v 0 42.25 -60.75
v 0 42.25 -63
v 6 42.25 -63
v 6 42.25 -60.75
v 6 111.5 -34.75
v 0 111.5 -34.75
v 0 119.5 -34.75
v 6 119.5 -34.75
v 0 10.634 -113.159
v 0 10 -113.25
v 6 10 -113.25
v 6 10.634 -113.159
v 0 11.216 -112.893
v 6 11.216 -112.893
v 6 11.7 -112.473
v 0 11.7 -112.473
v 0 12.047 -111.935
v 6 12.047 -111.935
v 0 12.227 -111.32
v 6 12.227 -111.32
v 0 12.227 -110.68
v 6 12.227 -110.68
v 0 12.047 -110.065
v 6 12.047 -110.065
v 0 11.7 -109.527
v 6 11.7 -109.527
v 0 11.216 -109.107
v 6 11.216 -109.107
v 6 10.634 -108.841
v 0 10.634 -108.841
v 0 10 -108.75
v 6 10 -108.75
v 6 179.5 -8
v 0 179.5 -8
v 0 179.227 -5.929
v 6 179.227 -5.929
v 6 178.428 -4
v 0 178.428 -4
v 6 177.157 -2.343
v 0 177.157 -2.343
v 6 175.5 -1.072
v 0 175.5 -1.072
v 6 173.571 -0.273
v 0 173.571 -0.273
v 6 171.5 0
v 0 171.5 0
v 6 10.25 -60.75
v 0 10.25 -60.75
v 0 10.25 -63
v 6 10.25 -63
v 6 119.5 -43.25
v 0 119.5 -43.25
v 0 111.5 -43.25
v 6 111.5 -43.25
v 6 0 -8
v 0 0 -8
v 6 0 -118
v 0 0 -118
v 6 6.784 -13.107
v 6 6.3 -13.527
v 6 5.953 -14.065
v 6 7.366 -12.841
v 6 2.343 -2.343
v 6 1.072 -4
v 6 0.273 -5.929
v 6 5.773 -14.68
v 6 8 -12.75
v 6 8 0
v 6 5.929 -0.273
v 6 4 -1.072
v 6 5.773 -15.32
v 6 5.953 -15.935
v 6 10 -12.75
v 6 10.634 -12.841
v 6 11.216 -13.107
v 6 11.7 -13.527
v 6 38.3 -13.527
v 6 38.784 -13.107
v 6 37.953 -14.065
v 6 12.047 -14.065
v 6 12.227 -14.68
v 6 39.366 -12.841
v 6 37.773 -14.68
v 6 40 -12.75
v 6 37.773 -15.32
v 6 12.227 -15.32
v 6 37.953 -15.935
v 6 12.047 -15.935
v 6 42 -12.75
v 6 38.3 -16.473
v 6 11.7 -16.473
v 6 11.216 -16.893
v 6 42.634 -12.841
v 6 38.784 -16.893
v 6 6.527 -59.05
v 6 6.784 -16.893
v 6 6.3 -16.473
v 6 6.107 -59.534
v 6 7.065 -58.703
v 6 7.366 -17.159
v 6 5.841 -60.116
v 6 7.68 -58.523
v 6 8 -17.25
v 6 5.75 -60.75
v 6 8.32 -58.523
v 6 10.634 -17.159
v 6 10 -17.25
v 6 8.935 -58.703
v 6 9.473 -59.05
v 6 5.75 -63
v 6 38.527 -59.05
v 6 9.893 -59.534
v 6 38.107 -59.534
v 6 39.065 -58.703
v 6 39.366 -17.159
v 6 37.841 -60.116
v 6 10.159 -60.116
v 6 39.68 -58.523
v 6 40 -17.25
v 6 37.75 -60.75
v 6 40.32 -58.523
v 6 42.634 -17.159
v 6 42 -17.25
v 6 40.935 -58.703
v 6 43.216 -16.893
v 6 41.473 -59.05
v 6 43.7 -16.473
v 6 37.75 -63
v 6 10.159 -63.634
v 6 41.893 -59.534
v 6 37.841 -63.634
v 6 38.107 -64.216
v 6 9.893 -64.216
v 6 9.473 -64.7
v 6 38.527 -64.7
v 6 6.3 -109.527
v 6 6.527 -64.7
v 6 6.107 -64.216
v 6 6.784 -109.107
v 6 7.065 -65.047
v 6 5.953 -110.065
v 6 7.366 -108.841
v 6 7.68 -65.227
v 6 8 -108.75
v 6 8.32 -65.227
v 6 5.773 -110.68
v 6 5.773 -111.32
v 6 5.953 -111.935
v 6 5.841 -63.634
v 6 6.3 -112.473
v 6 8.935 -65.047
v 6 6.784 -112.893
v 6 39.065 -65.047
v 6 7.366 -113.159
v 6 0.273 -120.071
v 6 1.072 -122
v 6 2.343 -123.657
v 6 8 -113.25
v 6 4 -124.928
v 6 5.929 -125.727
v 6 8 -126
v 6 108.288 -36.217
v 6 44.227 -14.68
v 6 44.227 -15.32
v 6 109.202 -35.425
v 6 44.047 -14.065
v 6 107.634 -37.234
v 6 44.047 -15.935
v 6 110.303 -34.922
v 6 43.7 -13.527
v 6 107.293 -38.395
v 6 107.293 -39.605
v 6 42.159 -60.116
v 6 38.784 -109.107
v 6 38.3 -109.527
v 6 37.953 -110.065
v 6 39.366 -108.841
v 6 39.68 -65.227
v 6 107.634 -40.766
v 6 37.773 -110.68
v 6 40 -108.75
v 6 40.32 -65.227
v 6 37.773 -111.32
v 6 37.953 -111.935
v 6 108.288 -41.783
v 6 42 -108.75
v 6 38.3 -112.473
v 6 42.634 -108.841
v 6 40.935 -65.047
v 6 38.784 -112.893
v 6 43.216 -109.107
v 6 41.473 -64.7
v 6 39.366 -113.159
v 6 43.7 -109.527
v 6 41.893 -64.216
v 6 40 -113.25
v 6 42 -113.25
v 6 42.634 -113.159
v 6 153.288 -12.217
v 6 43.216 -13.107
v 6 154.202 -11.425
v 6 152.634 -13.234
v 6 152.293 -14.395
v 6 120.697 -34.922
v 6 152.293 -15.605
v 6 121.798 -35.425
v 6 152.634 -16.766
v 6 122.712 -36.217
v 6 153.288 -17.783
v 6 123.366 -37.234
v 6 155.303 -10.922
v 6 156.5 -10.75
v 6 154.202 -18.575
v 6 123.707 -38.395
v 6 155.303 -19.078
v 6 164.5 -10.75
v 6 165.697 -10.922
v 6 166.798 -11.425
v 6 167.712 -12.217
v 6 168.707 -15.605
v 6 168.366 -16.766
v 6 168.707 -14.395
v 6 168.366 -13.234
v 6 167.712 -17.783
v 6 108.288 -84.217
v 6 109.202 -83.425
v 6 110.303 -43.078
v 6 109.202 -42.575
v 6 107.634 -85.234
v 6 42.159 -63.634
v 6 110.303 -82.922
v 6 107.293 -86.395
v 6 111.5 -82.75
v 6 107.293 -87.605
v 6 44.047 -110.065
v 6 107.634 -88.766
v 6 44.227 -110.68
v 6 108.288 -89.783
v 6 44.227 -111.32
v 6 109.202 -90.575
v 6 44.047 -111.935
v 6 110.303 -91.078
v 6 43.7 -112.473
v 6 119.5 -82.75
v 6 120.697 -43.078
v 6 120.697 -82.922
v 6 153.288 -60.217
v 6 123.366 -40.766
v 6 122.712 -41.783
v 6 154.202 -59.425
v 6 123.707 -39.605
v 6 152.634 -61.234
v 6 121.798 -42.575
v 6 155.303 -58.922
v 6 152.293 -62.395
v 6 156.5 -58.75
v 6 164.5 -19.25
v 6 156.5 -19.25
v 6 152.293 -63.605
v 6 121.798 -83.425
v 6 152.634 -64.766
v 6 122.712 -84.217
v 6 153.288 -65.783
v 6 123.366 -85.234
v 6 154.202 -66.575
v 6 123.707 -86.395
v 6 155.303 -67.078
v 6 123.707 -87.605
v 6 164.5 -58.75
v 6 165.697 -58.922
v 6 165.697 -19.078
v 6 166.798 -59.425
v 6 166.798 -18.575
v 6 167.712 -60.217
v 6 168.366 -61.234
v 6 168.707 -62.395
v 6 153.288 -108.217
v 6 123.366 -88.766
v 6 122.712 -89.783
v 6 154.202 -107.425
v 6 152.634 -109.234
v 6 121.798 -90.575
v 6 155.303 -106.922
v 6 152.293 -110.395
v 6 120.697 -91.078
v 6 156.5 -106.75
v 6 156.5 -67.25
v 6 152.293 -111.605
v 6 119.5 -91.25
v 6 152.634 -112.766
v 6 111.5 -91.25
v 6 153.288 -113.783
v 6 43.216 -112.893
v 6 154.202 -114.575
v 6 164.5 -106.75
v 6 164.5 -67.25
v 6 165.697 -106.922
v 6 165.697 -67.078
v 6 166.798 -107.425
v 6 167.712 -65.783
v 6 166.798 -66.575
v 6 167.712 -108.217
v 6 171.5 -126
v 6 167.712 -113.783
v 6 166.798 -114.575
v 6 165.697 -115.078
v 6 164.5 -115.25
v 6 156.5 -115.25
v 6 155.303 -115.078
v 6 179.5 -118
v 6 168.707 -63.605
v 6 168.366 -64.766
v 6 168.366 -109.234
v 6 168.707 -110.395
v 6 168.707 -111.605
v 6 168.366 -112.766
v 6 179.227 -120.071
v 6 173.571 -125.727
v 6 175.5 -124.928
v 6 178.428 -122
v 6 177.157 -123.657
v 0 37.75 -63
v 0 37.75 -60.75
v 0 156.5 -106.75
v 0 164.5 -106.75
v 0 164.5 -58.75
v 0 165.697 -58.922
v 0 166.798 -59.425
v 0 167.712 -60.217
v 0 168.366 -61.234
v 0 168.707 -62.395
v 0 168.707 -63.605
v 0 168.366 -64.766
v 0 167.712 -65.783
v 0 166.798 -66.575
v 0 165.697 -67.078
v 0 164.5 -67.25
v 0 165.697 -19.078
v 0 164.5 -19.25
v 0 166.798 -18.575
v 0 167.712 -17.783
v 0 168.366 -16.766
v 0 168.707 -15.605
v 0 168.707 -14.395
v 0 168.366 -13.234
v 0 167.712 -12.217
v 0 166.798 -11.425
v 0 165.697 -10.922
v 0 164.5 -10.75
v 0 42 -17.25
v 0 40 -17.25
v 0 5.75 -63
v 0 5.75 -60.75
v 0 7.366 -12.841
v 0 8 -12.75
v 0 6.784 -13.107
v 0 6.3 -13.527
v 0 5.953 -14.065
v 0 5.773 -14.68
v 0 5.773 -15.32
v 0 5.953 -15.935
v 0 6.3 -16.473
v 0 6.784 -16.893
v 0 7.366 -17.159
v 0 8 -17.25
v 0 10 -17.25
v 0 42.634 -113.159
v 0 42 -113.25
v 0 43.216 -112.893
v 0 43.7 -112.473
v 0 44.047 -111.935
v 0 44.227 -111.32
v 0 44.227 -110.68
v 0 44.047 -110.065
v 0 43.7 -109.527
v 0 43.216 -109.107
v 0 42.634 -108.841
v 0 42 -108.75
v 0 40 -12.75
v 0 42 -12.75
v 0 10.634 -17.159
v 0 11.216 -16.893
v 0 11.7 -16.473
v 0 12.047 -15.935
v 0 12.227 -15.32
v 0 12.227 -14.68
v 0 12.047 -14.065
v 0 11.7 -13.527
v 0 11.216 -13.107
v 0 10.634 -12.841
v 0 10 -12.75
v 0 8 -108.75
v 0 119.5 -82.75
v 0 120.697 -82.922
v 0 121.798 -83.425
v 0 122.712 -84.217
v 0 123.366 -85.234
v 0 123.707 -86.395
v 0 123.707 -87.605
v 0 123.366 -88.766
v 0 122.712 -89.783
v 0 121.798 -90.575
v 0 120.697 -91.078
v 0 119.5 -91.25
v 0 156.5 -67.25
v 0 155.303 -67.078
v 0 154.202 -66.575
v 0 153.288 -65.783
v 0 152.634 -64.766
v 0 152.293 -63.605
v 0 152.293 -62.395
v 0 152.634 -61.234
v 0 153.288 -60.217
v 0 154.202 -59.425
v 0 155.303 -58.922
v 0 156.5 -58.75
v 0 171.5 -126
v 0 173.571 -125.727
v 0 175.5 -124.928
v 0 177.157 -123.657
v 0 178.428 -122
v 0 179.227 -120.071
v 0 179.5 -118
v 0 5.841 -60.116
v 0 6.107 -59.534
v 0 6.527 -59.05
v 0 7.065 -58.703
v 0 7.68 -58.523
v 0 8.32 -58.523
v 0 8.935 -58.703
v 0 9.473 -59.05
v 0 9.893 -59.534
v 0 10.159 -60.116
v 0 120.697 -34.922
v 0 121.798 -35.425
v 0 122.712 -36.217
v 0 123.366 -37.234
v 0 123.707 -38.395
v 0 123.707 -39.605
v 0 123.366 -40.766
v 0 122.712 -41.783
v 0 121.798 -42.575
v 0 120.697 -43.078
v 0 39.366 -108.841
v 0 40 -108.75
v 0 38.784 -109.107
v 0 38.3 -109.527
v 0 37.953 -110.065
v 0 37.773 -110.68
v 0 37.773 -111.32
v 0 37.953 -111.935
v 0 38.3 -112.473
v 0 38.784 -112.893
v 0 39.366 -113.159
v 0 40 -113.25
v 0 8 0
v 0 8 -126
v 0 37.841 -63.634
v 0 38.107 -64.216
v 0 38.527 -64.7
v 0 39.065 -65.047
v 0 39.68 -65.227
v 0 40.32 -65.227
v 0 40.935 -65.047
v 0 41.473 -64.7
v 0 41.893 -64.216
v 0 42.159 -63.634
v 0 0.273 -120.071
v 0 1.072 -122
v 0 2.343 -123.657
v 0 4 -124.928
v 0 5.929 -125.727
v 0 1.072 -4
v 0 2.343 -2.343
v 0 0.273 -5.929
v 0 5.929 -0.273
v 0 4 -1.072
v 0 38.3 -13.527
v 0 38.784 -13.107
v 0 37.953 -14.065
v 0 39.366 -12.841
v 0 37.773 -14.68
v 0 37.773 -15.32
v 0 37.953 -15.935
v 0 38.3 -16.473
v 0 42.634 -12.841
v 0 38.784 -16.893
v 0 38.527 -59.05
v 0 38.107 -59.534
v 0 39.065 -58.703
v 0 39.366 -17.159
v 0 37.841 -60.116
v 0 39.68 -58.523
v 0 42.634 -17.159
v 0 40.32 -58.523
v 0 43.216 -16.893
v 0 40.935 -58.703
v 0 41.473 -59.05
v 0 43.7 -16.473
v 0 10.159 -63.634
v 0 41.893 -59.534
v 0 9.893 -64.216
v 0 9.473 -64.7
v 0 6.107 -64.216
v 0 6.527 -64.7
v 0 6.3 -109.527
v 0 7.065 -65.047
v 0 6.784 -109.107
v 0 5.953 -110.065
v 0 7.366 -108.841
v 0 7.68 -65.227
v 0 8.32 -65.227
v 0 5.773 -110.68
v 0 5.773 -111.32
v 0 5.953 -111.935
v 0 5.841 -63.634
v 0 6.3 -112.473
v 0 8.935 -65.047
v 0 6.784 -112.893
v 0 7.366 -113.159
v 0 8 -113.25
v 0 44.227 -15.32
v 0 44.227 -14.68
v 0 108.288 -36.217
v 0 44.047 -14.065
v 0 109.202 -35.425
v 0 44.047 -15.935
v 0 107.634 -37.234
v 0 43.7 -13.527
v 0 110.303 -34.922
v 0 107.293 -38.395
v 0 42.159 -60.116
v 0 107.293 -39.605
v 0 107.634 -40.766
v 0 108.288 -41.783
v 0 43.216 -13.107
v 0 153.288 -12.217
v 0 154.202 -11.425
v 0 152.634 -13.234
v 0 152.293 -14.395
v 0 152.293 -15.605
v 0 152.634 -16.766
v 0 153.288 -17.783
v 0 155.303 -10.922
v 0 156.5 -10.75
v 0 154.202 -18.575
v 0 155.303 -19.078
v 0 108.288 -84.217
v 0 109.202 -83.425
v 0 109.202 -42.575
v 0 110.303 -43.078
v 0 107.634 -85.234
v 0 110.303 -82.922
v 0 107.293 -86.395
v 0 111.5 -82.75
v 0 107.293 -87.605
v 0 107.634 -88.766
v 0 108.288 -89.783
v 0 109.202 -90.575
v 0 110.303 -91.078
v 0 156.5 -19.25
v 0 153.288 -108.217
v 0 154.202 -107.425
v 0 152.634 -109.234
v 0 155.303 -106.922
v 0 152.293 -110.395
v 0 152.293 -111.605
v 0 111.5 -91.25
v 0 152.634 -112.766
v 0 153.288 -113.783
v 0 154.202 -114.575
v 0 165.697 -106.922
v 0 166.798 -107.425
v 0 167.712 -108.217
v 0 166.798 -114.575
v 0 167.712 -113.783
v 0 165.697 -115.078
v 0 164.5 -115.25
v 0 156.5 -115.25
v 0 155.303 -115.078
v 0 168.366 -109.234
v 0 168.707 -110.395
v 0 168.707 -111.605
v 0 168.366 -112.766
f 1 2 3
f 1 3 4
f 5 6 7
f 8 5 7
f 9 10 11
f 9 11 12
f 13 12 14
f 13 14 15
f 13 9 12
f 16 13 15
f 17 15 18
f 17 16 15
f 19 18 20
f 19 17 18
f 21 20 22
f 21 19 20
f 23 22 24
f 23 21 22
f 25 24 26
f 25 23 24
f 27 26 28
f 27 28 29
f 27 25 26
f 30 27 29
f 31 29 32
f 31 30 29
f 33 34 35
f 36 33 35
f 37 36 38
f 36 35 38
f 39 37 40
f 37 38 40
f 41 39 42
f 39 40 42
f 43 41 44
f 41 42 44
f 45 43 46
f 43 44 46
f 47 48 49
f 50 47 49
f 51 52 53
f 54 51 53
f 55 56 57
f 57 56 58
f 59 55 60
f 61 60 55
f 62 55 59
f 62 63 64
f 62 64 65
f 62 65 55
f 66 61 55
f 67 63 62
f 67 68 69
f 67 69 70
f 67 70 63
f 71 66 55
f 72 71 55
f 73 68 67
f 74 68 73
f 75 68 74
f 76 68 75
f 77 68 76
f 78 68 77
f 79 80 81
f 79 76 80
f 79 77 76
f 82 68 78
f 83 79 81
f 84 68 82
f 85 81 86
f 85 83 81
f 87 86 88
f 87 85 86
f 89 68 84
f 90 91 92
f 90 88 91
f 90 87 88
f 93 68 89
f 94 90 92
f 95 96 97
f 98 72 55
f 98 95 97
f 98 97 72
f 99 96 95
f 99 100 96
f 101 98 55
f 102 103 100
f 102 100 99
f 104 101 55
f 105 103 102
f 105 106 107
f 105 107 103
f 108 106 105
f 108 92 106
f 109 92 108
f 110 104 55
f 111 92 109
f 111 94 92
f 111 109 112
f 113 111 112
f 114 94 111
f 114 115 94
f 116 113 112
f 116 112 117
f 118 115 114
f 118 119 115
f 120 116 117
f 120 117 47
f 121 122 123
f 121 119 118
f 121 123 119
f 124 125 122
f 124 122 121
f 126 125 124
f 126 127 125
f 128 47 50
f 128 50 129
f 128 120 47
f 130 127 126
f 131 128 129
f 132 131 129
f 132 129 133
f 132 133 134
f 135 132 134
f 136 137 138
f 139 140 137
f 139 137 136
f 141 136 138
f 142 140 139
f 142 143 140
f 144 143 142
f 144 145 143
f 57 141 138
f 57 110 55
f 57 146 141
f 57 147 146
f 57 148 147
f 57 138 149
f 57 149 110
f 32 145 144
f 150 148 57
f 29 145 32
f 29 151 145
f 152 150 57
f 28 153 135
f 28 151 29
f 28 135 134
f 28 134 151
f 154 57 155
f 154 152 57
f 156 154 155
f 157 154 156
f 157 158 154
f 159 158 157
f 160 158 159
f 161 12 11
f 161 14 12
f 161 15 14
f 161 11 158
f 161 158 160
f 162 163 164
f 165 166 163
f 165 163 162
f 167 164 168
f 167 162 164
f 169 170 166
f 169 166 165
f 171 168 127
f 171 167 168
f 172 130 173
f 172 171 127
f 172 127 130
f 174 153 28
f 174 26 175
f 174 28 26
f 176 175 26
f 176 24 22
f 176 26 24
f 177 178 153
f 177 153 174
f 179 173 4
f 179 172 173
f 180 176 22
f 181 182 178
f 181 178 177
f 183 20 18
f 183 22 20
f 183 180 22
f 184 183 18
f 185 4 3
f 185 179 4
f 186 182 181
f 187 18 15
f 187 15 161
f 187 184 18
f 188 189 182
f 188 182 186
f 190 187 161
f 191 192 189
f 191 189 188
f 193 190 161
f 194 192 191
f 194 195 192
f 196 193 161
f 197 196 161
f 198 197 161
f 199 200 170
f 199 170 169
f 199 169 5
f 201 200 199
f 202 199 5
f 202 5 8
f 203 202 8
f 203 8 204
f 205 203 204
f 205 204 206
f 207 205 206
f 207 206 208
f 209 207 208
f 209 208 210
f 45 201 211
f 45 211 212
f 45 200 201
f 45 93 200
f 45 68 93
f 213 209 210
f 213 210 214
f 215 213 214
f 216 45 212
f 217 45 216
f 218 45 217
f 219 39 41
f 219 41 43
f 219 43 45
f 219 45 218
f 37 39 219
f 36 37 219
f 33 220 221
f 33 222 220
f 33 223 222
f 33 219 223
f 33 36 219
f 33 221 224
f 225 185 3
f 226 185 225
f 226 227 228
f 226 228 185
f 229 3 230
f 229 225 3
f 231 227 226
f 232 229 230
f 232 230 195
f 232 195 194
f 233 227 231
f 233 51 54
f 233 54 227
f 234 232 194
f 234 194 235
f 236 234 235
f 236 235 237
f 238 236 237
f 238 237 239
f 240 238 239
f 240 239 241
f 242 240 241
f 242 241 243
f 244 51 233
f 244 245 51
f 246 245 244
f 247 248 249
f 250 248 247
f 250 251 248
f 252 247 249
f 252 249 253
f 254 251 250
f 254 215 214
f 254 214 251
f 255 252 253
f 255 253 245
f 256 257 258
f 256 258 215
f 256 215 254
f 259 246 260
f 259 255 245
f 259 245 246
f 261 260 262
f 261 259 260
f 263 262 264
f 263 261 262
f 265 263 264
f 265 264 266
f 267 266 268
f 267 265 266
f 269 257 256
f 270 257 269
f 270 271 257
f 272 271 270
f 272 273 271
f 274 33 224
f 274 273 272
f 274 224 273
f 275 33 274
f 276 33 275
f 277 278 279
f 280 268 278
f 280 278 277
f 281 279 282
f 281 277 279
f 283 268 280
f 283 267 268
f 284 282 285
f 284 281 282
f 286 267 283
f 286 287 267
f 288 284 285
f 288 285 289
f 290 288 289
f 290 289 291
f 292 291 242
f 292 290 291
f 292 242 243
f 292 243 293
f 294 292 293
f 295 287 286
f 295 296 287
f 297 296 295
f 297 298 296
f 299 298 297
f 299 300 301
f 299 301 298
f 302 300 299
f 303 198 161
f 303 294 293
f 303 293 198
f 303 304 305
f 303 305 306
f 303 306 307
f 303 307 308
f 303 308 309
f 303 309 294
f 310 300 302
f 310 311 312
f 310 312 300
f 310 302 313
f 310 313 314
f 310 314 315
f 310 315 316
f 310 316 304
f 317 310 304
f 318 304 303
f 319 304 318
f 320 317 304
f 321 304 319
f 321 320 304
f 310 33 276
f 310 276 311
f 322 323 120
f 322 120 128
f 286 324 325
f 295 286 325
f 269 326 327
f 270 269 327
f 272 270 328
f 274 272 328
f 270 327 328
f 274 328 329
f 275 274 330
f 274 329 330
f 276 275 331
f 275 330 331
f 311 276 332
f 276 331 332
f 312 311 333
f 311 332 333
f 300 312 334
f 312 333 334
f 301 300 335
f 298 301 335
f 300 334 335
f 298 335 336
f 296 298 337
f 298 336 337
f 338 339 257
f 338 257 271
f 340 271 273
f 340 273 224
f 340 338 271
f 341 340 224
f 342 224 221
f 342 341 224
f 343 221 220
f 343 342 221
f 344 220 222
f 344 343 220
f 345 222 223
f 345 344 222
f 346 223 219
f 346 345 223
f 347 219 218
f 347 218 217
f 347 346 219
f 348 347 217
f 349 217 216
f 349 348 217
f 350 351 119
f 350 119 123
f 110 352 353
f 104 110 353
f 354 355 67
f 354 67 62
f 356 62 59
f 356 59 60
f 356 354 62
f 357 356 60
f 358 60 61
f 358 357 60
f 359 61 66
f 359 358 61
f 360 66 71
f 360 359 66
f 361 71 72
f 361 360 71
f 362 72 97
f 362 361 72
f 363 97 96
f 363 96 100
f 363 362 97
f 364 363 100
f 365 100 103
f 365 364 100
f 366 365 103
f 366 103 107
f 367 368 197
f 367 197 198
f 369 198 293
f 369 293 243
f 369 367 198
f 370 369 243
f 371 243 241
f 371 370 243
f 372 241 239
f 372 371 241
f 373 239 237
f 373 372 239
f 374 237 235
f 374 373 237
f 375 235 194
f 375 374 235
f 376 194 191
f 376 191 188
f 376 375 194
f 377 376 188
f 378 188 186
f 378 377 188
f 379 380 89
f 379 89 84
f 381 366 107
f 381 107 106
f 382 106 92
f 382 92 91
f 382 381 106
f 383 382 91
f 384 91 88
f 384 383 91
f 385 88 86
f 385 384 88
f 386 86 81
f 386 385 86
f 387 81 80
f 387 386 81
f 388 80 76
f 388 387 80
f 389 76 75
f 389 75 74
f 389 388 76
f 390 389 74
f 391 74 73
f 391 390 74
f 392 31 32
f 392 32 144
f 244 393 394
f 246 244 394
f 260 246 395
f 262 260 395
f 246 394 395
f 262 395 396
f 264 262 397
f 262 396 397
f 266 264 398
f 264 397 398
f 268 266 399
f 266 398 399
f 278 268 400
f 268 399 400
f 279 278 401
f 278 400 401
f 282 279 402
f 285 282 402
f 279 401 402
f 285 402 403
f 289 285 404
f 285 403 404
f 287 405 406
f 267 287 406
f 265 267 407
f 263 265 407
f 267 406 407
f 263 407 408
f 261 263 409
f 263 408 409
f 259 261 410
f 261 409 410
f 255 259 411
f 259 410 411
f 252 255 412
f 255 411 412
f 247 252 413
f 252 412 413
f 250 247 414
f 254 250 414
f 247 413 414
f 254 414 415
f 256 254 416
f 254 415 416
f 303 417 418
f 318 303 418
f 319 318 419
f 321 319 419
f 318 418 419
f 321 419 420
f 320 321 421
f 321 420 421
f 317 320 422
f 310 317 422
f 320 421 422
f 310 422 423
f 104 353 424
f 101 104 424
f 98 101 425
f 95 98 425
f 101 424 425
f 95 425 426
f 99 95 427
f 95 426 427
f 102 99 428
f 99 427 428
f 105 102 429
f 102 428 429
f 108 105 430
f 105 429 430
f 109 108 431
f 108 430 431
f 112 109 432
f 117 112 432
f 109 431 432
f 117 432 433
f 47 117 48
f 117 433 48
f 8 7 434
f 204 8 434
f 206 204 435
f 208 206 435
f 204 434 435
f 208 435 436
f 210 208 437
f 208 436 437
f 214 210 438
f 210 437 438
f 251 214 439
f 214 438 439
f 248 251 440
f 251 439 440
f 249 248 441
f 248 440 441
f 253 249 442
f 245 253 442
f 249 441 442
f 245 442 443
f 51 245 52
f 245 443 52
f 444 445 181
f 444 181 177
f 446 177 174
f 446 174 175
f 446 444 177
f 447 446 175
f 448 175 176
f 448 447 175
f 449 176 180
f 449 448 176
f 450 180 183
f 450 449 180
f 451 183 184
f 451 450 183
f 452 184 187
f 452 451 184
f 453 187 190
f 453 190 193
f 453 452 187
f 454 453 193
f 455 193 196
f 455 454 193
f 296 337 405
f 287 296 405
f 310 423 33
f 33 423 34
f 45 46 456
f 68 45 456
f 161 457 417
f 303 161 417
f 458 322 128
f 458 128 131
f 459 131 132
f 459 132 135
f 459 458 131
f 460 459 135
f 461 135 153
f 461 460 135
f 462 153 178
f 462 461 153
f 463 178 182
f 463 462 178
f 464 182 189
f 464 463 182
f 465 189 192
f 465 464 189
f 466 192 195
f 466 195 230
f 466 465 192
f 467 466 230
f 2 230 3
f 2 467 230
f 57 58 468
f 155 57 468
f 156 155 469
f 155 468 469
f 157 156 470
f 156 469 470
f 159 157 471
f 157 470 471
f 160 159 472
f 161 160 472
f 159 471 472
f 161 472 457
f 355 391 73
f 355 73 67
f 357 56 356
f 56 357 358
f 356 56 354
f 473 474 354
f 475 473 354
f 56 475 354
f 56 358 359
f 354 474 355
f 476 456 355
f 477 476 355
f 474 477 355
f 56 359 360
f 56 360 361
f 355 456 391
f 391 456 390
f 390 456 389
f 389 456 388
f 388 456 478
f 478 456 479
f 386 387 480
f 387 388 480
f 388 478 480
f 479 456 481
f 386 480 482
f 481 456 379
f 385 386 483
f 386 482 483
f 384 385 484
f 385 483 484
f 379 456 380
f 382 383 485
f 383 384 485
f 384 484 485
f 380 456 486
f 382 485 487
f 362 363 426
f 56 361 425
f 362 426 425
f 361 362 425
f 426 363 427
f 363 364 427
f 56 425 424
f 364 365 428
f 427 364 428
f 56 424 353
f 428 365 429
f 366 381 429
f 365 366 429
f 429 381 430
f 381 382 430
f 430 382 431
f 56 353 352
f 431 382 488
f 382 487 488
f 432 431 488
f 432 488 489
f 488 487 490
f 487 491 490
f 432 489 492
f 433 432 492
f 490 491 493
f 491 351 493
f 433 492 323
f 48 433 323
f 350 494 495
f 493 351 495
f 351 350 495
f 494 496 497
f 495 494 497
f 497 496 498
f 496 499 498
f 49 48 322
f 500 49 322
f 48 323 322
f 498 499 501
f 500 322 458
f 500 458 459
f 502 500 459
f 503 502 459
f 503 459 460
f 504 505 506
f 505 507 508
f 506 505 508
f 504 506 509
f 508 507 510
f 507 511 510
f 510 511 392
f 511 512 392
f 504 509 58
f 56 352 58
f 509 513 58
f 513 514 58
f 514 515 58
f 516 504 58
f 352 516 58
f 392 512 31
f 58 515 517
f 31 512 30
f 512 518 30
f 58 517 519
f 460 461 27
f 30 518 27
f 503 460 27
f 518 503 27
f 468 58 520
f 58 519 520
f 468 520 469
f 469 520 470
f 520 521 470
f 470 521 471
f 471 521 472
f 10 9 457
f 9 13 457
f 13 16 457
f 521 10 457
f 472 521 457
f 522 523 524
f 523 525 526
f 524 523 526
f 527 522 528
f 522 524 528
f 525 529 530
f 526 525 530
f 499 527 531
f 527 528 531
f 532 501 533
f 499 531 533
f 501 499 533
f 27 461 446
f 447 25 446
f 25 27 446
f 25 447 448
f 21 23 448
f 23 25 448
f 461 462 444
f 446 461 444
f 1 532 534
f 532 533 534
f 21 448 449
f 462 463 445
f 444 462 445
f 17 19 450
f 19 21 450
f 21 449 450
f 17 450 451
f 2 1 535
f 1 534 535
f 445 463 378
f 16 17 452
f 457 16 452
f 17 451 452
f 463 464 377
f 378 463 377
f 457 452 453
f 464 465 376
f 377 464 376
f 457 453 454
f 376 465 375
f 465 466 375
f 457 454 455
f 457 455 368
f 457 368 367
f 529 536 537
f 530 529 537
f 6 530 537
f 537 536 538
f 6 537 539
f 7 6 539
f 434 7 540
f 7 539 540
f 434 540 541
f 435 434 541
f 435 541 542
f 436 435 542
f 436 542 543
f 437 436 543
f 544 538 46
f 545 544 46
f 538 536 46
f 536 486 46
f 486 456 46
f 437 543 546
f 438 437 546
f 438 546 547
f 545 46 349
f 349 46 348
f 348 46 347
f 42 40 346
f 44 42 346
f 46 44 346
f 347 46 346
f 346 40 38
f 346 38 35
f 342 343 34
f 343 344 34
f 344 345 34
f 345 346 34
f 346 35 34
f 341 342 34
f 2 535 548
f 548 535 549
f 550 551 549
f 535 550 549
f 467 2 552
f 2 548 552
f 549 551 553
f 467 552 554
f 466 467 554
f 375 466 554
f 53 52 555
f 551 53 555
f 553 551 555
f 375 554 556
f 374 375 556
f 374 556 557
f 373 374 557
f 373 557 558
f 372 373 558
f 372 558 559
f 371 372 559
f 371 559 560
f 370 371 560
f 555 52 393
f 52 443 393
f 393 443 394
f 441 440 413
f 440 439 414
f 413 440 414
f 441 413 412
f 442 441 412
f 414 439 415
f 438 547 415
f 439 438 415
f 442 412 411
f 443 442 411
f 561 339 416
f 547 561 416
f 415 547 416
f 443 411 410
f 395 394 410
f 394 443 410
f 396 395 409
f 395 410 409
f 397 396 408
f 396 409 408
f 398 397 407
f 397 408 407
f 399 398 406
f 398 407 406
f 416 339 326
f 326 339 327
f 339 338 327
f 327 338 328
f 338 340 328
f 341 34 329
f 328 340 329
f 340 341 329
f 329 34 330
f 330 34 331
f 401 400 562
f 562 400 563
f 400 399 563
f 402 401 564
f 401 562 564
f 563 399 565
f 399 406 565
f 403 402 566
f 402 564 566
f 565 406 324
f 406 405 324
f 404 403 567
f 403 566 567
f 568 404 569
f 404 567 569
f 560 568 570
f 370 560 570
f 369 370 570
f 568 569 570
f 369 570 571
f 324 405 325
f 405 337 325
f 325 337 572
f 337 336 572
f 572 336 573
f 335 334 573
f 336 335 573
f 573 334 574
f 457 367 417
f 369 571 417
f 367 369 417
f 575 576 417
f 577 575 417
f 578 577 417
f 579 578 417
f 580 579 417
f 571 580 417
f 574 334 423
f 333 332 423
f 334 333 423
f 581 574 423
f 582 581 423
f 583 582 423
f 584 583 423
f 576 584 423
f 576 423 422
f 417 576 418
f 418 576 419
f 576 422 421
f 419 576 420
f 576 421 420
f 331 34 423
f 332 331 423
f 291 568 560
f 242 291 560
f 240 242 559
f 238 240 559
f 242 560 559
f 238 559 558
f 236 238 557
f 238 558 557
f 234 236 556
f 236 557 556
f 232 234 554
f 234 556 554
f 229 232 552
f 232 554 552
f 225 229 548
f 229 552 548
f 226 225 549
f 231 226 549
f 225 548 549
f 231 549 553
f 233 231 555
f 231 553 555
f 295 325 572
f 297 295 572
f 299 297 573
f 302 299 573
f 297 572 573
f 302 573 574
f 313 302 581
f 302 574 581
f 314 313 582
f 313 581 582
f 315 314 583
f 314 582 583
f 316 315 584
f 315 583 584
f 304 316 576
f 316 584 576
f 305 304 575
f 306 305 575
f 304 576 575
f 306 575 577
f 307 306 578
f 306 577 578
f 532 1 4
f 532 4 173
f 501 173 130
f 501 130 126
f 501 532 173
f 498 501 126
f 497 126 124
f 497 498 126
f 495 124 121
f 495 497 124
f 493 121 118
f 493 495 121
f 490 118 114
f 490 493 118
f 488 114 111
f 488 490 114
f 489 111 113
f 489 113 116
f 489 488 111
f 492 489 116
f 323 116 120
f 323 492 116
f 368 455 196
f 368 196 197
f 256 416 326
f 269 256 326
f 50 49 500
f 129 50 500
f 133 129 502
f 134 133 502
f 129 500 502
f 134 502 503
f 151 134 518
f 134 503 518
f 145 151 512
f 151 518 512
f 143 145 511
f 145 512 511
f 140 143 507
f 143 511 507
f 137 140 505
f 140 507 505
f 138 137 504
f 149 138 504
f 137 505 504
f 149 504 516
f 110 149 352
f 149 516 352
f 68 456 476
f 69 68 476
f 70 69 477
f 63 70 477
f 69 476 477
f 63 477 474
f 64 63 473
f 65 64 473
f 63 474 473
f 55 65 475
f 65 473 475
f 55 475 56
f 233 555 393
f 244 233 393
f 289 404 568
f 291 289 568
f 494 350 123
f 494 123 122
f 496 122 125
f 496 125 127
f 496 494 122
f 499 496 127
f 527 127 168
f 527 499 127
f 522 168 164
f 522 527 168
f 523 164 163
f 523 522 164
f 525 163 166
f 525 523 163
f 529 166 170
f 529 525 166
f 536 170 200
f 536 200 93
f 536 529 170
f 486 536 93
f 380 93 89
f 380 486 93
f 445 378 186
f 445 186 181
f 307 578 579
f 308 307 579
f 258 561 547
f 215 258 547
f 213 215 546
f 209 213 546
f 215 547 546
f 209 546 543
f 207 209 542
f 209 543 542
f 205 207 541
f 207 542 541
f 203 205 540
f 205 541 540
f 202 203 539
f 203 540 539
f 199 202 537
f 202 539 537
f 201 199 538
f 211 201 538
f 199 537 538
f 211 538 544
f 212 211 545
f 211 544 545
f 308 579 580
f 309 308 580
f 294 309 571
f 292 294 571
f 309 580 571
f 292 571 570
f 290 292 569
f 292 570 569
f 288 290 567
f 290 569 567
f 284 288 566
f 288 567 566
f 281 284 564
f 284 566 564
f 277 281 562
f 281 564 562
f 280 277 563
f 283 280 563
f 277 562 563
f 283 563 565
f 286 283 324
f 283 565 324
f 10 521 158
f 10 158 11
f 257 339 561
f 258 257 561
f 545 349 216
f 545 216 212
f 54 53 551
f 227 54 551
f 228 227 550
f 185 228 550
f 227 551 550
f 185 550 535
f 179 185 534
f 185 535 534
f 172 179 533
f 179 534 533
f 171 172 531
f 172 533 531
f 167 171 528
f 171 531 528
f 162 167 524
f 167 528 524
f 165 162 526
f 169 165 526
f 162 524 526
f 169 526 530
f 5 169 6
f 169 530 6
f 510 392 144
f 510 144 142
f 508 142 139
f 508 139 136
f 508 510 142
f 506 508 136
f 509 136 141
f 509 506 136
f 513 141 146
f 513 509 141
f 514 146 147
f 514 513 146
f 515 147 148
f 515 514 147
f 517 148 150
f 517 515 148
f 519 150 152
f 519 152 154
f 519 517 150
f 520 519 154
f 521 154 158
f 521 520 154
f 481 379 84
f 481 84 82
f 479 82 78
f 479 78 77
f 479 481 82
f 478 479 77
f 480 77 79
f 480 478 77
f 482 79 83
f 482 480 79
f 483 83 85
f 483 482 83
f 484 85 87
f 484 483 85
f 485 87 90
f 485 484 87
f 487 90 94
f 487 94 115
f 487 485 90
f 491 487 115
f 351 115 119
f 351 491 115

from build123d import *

# Parameters (mm, degrees)
EXTRUDE_2_DEPTH          = 6
CUT_EXTRUDE_1_DEPTH      = 7
CUT_EXTRUDE_1_DEPTH_BACK = 1


with BuildPart() as part:
    # 草图1 → 凸台-拉伸2 (new body)
    with BuildSketch(Plane(origin=(0, 0, 0), x_dir=(0, 0, -1), z_dir=(1, 0, 0))):
        with BuildLine():
            Line((8, 0), (118, 0))
            ThreePointArc((118, 0), (123.656854249, 2.343145751), (126, 8))
            Line((126, 8), (126, 171.5))
            ThreePointArc((126, 171.5), (123.656854249, 177.156854249), (118, 179.5))
            Line((118, 179.5), (8, 179.5))
            ThreePointArc((8, 179.5), (2.343145751, 177.156854249), (0, 171.5))
            Line((0, 171.5), (0, 8))
            ThreePointArc((0, 8), (2.343145751, 2.343145751), (8, 0))
        make_face()
        with BuildLine():
            Line((12.75, 10), (12.75, 8))
            ThreePointArc((12.75, 8), (15, 5.75), (17.25, 8))
            Line((17.25, 8), (17.25, 10))
            ThreePointArc((17.25, 10), (15, 12.25), (12.75, 10))
        make_face(mode=Mode.SUBTRACT)
        with BuildLine():
            Line((12.75, 42), (12.75, 40))
            ThreePointArc((12.75, 40), (15, 37.75), (17.25, 40))
            Line((17.25, 40), (17.25, 42))
            ThreePointArc((17.25, 42), (15, 44.25), (12.75, 42))
        make_face(mode=Mode.SUBTRACT)
        with BuildLine():
            Line((108.75, 42), (108.75, 40))
            ThreePointArc((108.75, 40), (111, 37.75), (113.25, 40))
            Line((113.25, 40), (113.25, 42))
            ThreePointArc((113.25, 42), (111, 44.25), (108.75, 42))
        make_face(mode=Mode.SUBTRACT)
        with BuildLine():
            Line((108.75, 10), (108.75, 8))
            ThreePointArc((108.75, 8), (111, 5.75), (113.25, 8))
            Line((113.25, 8), (113.25, 10))
            ThreePointArc((113.25, 10), (111, 12.25), (108.75, 10))
        make_face(mode=Mode.SUBTRACT)
        with BuildLine():
            Line((60.75, 37.75), (63, 37.75))
            ThreePointArc((63, 37.75), (65.25, 40), (63, 42.25))
            Line((63, 42.25), (60.75, 42.25))
            ThreePointArc((60.75, 42.25), (58.5, 40), (60.75, 37.75))
        make_face(mode=Mode.SUBTRACT)
        with BuildLine():
            Line((60.75, 10.25), (63, 10.25))
            ThreePointArc((63, 10.25), (65.25, 8), (63, 5.75))
            Line((63, 5.75), (60.75, 5.75))
            ThreePointArc((60.75, 5.75), (58.5, 8), (60.75, 10.25))
        make_face(mode=Mode.SUBTRACT)
        with BuildLine():
            Line((34.75, 116.5), (34.75, 119.5))
            ThreePointArc((34.75, 119.5), (39, 123.75), (43.25, 119.5))
            Line((43.25, 119.5), (43.25, 116.5))
            ThreePointArc((43.25, 116.5), (39, 112.25), (34.75, 116.5))
        make_face(mode=Mode.SUBTRACT)
        with BuildLine():
            Line((82.75, 116.5), (82.75, 119.5))
            ThreePointArc((82.75, 119.5), (87, 123.75), (91.25, 119.5))
            Line((91.25, 119.5), (91.25, 116.5))
            ThreePointArc((91.25, 116.5), (87, 112.25), (82.75, 116.5))
        make_face(mode=Mode.SUBTRACT)
        with BuildLine():
            Line((10.75, 164.5), (10.75, 161.5))
            ThreePointArc((10.75, 161.5), (15, 157.25), (19.25, 161.5))
            Line((19.25, 161.5), (19.25, 164.5))
            ThreePointArc((19.25, 164.5), (15, 168.75), (10.75, 164.5))
        make_face(mode=Mode.SUBTRACT)
        with BuildLine():
            Line((67.25, 164.5), (67.25, 161.5))
            ThreePointArc((67.25, 161.5), (63, 157.25), (58.75, 161.5))
            Line((58.75, 161.5), (58.75, 164.5))
            ThreePointArc((58.75, 164.5), (63, 168.75), (67.25, 164.5))
        make_face(mode=Mode.SUBTRACT)
        with BuildLine():
            Line((115.25, 164.5), (115.25, 161.5))
            ThreePointArc((115.25, 161.5), (111, 157.25), (106.75, 161.5))
            Line((106.75, 161.5), (106.75, 164.5))
            ThreePointArc((106.75, 164.5), (111, 168.75), (115.25, 164.5))
        make_face(mode=Mode.SUBTRACT)
    extrude(amount=EXTRUDE_2_DEPTH)

    # 草图2 → 切除-拉伸1 (cut, two sides)
    with BuildSketch(Plane(origin=(0, 0, 0), x_dir=(0, 0, -1), z_dir=(1, 0, 0))) as cut_extrude_1_sk:
        with BuildLine():
            Line((43.25, 119.5), (43.25, 111.5))
            ThreePointArc((43.25, 111.5), (39, 107.25), (34.75, 111.5))
            Line((34.75, 111.5), (34.75, 119.5))
            ThreePointArc((34.75, 119.5), (39, 123.75), (43.25, 119.5))
        make_face()
        with BuildLine():
            Line((91.25, 119.5), (91.25, 111.5))
            ThreePointArc((91.25, 111.5), (87, 107.25), (82.75, 111.5))
            Line((82.75, 111.5), (82.75, 119.5))
            ThreePointArc((82.75, 119.5), (87, 123.75), (91.25, 119.5))
        make_face()
        with BuildLine():
            Line((19.25, 164.5), (19.25, 156.5))
            ThreePointArc((19.25, 156.5), (15, 152.25), (10.75, 156.5))
            Line((10.75, 156.5), (10.75, 164.5))
            ThreePointArc((10.75, 164.5), (15, 168.75), (19.25, 164.5))
        make_face()
        with BuildLine():
            Line((67.25, 164.5), (67.25, 156.5))
            ThreePointArc((67.25, 156.5), (63, 152.25), (58.75, 156.5))
            Line((58.75, 156.5), (58.75, 164.5))
            ThreePointArc((58.75, 164.5), (63, 168.75), (67.25, 164.5))
        make_face()
        with BuildLine():
            Line((115.25, 164.5), (115.25, 156.5))
            ThreePointArc((115.25, 156.5), (111, 152.25), (106.75, 156.5))
            Line((106.75, 156.5), (106.75, 164.5))
            ThreePointArc((106.75, 164.5), (111, 168.75), (115.25, 164.5))
        make_face()
    extrude(amount=CUT_EXTRUDE_1_DEPTH, mode=Mode.SUBTRACT)
    extrude(cut_extrude_1_sk.sketch, amount=-CUT_EXTRUDE_1_DEPTH_BACK, mode=Mode.SUBTRACT)


solid = part.part
